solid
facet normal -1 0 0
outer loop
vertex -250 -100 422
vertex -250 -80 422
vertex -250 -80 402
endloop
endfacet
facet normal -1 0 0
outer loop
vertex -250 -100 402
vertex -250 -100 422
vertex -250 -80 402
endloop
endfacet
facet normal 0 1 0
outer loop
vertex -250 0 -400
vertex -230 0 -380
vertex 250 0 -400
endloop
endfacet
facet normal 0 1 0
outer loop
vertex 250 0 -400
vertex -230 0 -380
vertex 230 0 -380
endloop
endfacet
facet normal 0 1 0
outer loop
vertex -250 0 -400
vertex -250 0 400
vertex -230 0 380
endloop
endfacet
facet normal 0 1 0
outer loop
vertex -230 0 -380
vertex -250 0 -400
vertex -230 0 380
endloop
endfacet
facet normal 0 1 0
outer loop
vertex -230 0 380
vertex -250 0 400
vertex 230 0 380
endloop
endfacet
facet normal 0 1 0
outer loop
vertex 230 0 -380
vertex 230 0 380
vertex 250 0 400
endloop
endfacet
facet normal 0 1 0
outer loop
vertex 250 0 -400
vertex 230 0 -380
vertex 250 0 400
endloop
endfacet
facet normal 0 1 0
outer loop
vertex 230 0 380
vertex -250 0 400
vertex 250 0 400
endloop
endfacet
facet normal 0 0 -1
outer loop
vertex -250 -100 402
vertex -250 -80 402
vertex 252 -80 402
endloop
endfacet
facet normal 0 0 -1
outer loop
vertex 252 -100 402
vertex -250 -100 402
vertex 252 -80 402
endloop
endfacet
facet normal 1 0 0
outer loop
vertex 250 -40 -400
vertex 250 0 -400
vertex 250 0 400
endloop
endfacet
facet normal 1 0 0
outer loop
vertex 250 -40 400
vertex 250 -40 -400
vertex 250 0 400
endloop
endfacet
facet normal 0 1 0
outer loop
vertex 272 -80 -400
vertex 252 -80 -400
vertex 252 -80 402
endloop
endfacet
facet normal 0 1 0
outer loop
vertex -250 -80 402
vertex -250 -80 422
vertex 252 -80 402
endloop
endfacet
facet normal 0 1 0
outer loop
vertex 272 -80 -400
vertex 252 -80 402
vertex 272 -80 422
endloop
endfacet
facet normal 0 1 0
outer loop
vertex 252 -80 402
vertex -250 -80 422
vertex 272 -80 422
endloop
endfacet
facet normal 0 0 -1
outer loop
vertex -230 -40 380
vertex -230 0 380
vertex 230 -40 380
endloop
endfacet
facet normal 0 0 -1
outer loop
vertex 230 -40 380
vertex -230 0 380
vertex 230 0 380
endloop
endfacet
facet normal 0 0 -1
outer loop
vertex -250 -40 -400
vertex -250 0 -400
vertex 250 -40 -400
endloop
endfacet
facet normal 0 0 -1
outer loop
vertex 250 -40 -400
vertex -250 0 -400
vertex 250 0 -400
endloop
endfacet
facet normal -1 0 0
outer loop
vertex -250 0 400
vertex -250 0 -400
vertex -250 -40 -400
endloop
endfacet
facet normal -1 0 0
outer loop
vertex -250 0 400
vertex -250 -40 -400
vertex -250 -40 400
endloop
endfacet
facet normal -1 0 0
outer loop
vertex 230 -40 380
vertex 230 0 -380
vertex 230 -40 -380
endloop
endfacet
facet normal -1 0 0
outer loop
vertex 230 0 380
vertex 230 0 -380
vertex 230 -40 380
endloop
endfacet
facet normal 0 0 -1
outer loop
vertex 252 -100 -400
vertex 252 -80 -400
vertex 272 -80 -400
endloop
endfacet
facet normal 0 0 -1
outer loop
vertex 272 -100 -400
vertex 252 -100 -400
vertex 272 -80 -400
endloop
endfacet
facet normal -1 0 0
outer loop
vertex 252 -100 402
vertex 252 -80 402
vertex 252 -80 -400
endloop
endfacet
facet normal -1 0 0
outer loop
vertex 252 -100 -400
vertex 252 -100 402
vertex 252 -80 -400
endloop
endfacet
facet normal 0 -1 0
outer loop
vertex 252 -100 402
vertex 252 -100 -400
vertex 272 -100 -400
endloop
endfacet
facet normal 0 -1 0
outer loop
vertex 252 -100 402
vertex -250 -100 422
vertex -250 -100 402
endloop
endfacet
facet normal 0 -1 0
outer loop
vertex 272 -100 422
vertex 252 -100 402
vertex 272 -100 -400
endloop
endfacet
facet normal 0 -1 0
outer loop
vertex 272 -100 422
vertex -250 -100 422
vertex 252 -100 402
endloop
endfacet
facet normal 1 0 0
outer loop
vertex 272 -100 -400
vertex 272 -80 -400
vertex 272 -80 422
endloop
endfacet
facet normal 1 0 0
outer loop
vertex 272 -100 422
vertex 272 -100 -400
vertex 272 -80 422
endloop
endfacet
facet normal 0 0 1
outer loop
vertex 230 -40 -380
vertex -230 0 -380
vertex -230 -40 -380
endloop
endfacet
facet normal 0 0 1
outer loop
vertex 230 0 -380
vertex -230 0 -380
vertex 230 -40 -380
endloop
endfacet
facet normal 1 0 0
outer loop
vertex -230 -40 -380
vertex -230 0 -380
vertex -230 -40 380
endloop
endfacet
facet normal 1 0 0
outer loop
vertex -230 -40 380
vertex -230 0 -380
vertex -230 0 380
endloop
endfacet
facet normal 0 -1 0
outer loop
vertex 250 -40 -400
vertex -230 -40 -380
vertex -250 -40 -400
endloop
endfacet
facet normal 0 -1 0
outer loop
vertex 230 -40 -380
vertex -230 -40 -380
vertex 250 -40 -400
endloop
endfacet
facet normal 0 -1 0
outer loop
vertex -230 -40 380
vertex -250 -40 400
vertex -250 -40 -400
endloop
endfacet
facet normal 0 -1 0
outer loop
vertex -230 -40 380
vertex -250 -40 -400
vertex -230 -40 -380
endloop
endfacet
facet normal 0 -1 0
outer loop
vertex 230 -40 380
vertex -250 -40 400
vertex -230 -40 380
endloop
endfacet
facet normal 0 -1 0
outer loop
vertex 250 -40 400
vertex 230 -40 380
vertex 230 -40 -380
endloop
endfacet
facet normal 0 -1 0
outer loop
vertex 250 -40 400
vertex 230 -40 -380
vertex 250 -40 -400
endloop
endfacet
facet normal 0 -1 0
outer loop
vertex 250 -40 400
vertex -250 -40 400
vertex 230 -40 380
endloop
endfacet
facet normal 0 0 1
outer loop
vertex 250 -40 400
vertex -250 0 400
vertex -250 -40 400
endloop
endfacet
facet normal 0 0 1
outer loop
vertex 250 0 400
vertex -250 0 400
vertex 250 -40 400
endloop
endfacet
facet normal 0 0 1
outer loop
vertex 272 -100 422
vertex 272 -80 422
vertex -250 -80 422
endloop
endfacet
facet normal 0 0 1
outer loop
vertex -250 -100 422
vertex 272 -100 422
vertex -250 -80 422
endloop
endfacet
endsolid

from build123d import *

# Parameters (mm, degrees)
F0_W     = 500
F0_H     = 800
F0_W_2   = 460
F0_H_2   = 760
F1_DEPTH = 40
F4_DEPTH = 20


with BuildPart() as f1:
    # F0 (on Front) → F1 (new body)
    with BuildSketch(Plane.XZ):
        Rectangle(F0_W, F0_H)
        Rectangle(F0_W_2, F0_H_2, mode=Mode.SUBTRACT)
    extrude(amount=F1_DEPTH)


with BuildPart() as f4:
    # F3 (on offset) → F4 (new body)
    with BuildSketch(Plane.XZ.offset(80)):
        Polygon((-250, 402), (252, 402), (252, -400), (272, -400), (272, 422), (-250, 422), align=None)
    extrude(amount=F4_DEPTH)


solid = Compound([f1.part, f4.part])
